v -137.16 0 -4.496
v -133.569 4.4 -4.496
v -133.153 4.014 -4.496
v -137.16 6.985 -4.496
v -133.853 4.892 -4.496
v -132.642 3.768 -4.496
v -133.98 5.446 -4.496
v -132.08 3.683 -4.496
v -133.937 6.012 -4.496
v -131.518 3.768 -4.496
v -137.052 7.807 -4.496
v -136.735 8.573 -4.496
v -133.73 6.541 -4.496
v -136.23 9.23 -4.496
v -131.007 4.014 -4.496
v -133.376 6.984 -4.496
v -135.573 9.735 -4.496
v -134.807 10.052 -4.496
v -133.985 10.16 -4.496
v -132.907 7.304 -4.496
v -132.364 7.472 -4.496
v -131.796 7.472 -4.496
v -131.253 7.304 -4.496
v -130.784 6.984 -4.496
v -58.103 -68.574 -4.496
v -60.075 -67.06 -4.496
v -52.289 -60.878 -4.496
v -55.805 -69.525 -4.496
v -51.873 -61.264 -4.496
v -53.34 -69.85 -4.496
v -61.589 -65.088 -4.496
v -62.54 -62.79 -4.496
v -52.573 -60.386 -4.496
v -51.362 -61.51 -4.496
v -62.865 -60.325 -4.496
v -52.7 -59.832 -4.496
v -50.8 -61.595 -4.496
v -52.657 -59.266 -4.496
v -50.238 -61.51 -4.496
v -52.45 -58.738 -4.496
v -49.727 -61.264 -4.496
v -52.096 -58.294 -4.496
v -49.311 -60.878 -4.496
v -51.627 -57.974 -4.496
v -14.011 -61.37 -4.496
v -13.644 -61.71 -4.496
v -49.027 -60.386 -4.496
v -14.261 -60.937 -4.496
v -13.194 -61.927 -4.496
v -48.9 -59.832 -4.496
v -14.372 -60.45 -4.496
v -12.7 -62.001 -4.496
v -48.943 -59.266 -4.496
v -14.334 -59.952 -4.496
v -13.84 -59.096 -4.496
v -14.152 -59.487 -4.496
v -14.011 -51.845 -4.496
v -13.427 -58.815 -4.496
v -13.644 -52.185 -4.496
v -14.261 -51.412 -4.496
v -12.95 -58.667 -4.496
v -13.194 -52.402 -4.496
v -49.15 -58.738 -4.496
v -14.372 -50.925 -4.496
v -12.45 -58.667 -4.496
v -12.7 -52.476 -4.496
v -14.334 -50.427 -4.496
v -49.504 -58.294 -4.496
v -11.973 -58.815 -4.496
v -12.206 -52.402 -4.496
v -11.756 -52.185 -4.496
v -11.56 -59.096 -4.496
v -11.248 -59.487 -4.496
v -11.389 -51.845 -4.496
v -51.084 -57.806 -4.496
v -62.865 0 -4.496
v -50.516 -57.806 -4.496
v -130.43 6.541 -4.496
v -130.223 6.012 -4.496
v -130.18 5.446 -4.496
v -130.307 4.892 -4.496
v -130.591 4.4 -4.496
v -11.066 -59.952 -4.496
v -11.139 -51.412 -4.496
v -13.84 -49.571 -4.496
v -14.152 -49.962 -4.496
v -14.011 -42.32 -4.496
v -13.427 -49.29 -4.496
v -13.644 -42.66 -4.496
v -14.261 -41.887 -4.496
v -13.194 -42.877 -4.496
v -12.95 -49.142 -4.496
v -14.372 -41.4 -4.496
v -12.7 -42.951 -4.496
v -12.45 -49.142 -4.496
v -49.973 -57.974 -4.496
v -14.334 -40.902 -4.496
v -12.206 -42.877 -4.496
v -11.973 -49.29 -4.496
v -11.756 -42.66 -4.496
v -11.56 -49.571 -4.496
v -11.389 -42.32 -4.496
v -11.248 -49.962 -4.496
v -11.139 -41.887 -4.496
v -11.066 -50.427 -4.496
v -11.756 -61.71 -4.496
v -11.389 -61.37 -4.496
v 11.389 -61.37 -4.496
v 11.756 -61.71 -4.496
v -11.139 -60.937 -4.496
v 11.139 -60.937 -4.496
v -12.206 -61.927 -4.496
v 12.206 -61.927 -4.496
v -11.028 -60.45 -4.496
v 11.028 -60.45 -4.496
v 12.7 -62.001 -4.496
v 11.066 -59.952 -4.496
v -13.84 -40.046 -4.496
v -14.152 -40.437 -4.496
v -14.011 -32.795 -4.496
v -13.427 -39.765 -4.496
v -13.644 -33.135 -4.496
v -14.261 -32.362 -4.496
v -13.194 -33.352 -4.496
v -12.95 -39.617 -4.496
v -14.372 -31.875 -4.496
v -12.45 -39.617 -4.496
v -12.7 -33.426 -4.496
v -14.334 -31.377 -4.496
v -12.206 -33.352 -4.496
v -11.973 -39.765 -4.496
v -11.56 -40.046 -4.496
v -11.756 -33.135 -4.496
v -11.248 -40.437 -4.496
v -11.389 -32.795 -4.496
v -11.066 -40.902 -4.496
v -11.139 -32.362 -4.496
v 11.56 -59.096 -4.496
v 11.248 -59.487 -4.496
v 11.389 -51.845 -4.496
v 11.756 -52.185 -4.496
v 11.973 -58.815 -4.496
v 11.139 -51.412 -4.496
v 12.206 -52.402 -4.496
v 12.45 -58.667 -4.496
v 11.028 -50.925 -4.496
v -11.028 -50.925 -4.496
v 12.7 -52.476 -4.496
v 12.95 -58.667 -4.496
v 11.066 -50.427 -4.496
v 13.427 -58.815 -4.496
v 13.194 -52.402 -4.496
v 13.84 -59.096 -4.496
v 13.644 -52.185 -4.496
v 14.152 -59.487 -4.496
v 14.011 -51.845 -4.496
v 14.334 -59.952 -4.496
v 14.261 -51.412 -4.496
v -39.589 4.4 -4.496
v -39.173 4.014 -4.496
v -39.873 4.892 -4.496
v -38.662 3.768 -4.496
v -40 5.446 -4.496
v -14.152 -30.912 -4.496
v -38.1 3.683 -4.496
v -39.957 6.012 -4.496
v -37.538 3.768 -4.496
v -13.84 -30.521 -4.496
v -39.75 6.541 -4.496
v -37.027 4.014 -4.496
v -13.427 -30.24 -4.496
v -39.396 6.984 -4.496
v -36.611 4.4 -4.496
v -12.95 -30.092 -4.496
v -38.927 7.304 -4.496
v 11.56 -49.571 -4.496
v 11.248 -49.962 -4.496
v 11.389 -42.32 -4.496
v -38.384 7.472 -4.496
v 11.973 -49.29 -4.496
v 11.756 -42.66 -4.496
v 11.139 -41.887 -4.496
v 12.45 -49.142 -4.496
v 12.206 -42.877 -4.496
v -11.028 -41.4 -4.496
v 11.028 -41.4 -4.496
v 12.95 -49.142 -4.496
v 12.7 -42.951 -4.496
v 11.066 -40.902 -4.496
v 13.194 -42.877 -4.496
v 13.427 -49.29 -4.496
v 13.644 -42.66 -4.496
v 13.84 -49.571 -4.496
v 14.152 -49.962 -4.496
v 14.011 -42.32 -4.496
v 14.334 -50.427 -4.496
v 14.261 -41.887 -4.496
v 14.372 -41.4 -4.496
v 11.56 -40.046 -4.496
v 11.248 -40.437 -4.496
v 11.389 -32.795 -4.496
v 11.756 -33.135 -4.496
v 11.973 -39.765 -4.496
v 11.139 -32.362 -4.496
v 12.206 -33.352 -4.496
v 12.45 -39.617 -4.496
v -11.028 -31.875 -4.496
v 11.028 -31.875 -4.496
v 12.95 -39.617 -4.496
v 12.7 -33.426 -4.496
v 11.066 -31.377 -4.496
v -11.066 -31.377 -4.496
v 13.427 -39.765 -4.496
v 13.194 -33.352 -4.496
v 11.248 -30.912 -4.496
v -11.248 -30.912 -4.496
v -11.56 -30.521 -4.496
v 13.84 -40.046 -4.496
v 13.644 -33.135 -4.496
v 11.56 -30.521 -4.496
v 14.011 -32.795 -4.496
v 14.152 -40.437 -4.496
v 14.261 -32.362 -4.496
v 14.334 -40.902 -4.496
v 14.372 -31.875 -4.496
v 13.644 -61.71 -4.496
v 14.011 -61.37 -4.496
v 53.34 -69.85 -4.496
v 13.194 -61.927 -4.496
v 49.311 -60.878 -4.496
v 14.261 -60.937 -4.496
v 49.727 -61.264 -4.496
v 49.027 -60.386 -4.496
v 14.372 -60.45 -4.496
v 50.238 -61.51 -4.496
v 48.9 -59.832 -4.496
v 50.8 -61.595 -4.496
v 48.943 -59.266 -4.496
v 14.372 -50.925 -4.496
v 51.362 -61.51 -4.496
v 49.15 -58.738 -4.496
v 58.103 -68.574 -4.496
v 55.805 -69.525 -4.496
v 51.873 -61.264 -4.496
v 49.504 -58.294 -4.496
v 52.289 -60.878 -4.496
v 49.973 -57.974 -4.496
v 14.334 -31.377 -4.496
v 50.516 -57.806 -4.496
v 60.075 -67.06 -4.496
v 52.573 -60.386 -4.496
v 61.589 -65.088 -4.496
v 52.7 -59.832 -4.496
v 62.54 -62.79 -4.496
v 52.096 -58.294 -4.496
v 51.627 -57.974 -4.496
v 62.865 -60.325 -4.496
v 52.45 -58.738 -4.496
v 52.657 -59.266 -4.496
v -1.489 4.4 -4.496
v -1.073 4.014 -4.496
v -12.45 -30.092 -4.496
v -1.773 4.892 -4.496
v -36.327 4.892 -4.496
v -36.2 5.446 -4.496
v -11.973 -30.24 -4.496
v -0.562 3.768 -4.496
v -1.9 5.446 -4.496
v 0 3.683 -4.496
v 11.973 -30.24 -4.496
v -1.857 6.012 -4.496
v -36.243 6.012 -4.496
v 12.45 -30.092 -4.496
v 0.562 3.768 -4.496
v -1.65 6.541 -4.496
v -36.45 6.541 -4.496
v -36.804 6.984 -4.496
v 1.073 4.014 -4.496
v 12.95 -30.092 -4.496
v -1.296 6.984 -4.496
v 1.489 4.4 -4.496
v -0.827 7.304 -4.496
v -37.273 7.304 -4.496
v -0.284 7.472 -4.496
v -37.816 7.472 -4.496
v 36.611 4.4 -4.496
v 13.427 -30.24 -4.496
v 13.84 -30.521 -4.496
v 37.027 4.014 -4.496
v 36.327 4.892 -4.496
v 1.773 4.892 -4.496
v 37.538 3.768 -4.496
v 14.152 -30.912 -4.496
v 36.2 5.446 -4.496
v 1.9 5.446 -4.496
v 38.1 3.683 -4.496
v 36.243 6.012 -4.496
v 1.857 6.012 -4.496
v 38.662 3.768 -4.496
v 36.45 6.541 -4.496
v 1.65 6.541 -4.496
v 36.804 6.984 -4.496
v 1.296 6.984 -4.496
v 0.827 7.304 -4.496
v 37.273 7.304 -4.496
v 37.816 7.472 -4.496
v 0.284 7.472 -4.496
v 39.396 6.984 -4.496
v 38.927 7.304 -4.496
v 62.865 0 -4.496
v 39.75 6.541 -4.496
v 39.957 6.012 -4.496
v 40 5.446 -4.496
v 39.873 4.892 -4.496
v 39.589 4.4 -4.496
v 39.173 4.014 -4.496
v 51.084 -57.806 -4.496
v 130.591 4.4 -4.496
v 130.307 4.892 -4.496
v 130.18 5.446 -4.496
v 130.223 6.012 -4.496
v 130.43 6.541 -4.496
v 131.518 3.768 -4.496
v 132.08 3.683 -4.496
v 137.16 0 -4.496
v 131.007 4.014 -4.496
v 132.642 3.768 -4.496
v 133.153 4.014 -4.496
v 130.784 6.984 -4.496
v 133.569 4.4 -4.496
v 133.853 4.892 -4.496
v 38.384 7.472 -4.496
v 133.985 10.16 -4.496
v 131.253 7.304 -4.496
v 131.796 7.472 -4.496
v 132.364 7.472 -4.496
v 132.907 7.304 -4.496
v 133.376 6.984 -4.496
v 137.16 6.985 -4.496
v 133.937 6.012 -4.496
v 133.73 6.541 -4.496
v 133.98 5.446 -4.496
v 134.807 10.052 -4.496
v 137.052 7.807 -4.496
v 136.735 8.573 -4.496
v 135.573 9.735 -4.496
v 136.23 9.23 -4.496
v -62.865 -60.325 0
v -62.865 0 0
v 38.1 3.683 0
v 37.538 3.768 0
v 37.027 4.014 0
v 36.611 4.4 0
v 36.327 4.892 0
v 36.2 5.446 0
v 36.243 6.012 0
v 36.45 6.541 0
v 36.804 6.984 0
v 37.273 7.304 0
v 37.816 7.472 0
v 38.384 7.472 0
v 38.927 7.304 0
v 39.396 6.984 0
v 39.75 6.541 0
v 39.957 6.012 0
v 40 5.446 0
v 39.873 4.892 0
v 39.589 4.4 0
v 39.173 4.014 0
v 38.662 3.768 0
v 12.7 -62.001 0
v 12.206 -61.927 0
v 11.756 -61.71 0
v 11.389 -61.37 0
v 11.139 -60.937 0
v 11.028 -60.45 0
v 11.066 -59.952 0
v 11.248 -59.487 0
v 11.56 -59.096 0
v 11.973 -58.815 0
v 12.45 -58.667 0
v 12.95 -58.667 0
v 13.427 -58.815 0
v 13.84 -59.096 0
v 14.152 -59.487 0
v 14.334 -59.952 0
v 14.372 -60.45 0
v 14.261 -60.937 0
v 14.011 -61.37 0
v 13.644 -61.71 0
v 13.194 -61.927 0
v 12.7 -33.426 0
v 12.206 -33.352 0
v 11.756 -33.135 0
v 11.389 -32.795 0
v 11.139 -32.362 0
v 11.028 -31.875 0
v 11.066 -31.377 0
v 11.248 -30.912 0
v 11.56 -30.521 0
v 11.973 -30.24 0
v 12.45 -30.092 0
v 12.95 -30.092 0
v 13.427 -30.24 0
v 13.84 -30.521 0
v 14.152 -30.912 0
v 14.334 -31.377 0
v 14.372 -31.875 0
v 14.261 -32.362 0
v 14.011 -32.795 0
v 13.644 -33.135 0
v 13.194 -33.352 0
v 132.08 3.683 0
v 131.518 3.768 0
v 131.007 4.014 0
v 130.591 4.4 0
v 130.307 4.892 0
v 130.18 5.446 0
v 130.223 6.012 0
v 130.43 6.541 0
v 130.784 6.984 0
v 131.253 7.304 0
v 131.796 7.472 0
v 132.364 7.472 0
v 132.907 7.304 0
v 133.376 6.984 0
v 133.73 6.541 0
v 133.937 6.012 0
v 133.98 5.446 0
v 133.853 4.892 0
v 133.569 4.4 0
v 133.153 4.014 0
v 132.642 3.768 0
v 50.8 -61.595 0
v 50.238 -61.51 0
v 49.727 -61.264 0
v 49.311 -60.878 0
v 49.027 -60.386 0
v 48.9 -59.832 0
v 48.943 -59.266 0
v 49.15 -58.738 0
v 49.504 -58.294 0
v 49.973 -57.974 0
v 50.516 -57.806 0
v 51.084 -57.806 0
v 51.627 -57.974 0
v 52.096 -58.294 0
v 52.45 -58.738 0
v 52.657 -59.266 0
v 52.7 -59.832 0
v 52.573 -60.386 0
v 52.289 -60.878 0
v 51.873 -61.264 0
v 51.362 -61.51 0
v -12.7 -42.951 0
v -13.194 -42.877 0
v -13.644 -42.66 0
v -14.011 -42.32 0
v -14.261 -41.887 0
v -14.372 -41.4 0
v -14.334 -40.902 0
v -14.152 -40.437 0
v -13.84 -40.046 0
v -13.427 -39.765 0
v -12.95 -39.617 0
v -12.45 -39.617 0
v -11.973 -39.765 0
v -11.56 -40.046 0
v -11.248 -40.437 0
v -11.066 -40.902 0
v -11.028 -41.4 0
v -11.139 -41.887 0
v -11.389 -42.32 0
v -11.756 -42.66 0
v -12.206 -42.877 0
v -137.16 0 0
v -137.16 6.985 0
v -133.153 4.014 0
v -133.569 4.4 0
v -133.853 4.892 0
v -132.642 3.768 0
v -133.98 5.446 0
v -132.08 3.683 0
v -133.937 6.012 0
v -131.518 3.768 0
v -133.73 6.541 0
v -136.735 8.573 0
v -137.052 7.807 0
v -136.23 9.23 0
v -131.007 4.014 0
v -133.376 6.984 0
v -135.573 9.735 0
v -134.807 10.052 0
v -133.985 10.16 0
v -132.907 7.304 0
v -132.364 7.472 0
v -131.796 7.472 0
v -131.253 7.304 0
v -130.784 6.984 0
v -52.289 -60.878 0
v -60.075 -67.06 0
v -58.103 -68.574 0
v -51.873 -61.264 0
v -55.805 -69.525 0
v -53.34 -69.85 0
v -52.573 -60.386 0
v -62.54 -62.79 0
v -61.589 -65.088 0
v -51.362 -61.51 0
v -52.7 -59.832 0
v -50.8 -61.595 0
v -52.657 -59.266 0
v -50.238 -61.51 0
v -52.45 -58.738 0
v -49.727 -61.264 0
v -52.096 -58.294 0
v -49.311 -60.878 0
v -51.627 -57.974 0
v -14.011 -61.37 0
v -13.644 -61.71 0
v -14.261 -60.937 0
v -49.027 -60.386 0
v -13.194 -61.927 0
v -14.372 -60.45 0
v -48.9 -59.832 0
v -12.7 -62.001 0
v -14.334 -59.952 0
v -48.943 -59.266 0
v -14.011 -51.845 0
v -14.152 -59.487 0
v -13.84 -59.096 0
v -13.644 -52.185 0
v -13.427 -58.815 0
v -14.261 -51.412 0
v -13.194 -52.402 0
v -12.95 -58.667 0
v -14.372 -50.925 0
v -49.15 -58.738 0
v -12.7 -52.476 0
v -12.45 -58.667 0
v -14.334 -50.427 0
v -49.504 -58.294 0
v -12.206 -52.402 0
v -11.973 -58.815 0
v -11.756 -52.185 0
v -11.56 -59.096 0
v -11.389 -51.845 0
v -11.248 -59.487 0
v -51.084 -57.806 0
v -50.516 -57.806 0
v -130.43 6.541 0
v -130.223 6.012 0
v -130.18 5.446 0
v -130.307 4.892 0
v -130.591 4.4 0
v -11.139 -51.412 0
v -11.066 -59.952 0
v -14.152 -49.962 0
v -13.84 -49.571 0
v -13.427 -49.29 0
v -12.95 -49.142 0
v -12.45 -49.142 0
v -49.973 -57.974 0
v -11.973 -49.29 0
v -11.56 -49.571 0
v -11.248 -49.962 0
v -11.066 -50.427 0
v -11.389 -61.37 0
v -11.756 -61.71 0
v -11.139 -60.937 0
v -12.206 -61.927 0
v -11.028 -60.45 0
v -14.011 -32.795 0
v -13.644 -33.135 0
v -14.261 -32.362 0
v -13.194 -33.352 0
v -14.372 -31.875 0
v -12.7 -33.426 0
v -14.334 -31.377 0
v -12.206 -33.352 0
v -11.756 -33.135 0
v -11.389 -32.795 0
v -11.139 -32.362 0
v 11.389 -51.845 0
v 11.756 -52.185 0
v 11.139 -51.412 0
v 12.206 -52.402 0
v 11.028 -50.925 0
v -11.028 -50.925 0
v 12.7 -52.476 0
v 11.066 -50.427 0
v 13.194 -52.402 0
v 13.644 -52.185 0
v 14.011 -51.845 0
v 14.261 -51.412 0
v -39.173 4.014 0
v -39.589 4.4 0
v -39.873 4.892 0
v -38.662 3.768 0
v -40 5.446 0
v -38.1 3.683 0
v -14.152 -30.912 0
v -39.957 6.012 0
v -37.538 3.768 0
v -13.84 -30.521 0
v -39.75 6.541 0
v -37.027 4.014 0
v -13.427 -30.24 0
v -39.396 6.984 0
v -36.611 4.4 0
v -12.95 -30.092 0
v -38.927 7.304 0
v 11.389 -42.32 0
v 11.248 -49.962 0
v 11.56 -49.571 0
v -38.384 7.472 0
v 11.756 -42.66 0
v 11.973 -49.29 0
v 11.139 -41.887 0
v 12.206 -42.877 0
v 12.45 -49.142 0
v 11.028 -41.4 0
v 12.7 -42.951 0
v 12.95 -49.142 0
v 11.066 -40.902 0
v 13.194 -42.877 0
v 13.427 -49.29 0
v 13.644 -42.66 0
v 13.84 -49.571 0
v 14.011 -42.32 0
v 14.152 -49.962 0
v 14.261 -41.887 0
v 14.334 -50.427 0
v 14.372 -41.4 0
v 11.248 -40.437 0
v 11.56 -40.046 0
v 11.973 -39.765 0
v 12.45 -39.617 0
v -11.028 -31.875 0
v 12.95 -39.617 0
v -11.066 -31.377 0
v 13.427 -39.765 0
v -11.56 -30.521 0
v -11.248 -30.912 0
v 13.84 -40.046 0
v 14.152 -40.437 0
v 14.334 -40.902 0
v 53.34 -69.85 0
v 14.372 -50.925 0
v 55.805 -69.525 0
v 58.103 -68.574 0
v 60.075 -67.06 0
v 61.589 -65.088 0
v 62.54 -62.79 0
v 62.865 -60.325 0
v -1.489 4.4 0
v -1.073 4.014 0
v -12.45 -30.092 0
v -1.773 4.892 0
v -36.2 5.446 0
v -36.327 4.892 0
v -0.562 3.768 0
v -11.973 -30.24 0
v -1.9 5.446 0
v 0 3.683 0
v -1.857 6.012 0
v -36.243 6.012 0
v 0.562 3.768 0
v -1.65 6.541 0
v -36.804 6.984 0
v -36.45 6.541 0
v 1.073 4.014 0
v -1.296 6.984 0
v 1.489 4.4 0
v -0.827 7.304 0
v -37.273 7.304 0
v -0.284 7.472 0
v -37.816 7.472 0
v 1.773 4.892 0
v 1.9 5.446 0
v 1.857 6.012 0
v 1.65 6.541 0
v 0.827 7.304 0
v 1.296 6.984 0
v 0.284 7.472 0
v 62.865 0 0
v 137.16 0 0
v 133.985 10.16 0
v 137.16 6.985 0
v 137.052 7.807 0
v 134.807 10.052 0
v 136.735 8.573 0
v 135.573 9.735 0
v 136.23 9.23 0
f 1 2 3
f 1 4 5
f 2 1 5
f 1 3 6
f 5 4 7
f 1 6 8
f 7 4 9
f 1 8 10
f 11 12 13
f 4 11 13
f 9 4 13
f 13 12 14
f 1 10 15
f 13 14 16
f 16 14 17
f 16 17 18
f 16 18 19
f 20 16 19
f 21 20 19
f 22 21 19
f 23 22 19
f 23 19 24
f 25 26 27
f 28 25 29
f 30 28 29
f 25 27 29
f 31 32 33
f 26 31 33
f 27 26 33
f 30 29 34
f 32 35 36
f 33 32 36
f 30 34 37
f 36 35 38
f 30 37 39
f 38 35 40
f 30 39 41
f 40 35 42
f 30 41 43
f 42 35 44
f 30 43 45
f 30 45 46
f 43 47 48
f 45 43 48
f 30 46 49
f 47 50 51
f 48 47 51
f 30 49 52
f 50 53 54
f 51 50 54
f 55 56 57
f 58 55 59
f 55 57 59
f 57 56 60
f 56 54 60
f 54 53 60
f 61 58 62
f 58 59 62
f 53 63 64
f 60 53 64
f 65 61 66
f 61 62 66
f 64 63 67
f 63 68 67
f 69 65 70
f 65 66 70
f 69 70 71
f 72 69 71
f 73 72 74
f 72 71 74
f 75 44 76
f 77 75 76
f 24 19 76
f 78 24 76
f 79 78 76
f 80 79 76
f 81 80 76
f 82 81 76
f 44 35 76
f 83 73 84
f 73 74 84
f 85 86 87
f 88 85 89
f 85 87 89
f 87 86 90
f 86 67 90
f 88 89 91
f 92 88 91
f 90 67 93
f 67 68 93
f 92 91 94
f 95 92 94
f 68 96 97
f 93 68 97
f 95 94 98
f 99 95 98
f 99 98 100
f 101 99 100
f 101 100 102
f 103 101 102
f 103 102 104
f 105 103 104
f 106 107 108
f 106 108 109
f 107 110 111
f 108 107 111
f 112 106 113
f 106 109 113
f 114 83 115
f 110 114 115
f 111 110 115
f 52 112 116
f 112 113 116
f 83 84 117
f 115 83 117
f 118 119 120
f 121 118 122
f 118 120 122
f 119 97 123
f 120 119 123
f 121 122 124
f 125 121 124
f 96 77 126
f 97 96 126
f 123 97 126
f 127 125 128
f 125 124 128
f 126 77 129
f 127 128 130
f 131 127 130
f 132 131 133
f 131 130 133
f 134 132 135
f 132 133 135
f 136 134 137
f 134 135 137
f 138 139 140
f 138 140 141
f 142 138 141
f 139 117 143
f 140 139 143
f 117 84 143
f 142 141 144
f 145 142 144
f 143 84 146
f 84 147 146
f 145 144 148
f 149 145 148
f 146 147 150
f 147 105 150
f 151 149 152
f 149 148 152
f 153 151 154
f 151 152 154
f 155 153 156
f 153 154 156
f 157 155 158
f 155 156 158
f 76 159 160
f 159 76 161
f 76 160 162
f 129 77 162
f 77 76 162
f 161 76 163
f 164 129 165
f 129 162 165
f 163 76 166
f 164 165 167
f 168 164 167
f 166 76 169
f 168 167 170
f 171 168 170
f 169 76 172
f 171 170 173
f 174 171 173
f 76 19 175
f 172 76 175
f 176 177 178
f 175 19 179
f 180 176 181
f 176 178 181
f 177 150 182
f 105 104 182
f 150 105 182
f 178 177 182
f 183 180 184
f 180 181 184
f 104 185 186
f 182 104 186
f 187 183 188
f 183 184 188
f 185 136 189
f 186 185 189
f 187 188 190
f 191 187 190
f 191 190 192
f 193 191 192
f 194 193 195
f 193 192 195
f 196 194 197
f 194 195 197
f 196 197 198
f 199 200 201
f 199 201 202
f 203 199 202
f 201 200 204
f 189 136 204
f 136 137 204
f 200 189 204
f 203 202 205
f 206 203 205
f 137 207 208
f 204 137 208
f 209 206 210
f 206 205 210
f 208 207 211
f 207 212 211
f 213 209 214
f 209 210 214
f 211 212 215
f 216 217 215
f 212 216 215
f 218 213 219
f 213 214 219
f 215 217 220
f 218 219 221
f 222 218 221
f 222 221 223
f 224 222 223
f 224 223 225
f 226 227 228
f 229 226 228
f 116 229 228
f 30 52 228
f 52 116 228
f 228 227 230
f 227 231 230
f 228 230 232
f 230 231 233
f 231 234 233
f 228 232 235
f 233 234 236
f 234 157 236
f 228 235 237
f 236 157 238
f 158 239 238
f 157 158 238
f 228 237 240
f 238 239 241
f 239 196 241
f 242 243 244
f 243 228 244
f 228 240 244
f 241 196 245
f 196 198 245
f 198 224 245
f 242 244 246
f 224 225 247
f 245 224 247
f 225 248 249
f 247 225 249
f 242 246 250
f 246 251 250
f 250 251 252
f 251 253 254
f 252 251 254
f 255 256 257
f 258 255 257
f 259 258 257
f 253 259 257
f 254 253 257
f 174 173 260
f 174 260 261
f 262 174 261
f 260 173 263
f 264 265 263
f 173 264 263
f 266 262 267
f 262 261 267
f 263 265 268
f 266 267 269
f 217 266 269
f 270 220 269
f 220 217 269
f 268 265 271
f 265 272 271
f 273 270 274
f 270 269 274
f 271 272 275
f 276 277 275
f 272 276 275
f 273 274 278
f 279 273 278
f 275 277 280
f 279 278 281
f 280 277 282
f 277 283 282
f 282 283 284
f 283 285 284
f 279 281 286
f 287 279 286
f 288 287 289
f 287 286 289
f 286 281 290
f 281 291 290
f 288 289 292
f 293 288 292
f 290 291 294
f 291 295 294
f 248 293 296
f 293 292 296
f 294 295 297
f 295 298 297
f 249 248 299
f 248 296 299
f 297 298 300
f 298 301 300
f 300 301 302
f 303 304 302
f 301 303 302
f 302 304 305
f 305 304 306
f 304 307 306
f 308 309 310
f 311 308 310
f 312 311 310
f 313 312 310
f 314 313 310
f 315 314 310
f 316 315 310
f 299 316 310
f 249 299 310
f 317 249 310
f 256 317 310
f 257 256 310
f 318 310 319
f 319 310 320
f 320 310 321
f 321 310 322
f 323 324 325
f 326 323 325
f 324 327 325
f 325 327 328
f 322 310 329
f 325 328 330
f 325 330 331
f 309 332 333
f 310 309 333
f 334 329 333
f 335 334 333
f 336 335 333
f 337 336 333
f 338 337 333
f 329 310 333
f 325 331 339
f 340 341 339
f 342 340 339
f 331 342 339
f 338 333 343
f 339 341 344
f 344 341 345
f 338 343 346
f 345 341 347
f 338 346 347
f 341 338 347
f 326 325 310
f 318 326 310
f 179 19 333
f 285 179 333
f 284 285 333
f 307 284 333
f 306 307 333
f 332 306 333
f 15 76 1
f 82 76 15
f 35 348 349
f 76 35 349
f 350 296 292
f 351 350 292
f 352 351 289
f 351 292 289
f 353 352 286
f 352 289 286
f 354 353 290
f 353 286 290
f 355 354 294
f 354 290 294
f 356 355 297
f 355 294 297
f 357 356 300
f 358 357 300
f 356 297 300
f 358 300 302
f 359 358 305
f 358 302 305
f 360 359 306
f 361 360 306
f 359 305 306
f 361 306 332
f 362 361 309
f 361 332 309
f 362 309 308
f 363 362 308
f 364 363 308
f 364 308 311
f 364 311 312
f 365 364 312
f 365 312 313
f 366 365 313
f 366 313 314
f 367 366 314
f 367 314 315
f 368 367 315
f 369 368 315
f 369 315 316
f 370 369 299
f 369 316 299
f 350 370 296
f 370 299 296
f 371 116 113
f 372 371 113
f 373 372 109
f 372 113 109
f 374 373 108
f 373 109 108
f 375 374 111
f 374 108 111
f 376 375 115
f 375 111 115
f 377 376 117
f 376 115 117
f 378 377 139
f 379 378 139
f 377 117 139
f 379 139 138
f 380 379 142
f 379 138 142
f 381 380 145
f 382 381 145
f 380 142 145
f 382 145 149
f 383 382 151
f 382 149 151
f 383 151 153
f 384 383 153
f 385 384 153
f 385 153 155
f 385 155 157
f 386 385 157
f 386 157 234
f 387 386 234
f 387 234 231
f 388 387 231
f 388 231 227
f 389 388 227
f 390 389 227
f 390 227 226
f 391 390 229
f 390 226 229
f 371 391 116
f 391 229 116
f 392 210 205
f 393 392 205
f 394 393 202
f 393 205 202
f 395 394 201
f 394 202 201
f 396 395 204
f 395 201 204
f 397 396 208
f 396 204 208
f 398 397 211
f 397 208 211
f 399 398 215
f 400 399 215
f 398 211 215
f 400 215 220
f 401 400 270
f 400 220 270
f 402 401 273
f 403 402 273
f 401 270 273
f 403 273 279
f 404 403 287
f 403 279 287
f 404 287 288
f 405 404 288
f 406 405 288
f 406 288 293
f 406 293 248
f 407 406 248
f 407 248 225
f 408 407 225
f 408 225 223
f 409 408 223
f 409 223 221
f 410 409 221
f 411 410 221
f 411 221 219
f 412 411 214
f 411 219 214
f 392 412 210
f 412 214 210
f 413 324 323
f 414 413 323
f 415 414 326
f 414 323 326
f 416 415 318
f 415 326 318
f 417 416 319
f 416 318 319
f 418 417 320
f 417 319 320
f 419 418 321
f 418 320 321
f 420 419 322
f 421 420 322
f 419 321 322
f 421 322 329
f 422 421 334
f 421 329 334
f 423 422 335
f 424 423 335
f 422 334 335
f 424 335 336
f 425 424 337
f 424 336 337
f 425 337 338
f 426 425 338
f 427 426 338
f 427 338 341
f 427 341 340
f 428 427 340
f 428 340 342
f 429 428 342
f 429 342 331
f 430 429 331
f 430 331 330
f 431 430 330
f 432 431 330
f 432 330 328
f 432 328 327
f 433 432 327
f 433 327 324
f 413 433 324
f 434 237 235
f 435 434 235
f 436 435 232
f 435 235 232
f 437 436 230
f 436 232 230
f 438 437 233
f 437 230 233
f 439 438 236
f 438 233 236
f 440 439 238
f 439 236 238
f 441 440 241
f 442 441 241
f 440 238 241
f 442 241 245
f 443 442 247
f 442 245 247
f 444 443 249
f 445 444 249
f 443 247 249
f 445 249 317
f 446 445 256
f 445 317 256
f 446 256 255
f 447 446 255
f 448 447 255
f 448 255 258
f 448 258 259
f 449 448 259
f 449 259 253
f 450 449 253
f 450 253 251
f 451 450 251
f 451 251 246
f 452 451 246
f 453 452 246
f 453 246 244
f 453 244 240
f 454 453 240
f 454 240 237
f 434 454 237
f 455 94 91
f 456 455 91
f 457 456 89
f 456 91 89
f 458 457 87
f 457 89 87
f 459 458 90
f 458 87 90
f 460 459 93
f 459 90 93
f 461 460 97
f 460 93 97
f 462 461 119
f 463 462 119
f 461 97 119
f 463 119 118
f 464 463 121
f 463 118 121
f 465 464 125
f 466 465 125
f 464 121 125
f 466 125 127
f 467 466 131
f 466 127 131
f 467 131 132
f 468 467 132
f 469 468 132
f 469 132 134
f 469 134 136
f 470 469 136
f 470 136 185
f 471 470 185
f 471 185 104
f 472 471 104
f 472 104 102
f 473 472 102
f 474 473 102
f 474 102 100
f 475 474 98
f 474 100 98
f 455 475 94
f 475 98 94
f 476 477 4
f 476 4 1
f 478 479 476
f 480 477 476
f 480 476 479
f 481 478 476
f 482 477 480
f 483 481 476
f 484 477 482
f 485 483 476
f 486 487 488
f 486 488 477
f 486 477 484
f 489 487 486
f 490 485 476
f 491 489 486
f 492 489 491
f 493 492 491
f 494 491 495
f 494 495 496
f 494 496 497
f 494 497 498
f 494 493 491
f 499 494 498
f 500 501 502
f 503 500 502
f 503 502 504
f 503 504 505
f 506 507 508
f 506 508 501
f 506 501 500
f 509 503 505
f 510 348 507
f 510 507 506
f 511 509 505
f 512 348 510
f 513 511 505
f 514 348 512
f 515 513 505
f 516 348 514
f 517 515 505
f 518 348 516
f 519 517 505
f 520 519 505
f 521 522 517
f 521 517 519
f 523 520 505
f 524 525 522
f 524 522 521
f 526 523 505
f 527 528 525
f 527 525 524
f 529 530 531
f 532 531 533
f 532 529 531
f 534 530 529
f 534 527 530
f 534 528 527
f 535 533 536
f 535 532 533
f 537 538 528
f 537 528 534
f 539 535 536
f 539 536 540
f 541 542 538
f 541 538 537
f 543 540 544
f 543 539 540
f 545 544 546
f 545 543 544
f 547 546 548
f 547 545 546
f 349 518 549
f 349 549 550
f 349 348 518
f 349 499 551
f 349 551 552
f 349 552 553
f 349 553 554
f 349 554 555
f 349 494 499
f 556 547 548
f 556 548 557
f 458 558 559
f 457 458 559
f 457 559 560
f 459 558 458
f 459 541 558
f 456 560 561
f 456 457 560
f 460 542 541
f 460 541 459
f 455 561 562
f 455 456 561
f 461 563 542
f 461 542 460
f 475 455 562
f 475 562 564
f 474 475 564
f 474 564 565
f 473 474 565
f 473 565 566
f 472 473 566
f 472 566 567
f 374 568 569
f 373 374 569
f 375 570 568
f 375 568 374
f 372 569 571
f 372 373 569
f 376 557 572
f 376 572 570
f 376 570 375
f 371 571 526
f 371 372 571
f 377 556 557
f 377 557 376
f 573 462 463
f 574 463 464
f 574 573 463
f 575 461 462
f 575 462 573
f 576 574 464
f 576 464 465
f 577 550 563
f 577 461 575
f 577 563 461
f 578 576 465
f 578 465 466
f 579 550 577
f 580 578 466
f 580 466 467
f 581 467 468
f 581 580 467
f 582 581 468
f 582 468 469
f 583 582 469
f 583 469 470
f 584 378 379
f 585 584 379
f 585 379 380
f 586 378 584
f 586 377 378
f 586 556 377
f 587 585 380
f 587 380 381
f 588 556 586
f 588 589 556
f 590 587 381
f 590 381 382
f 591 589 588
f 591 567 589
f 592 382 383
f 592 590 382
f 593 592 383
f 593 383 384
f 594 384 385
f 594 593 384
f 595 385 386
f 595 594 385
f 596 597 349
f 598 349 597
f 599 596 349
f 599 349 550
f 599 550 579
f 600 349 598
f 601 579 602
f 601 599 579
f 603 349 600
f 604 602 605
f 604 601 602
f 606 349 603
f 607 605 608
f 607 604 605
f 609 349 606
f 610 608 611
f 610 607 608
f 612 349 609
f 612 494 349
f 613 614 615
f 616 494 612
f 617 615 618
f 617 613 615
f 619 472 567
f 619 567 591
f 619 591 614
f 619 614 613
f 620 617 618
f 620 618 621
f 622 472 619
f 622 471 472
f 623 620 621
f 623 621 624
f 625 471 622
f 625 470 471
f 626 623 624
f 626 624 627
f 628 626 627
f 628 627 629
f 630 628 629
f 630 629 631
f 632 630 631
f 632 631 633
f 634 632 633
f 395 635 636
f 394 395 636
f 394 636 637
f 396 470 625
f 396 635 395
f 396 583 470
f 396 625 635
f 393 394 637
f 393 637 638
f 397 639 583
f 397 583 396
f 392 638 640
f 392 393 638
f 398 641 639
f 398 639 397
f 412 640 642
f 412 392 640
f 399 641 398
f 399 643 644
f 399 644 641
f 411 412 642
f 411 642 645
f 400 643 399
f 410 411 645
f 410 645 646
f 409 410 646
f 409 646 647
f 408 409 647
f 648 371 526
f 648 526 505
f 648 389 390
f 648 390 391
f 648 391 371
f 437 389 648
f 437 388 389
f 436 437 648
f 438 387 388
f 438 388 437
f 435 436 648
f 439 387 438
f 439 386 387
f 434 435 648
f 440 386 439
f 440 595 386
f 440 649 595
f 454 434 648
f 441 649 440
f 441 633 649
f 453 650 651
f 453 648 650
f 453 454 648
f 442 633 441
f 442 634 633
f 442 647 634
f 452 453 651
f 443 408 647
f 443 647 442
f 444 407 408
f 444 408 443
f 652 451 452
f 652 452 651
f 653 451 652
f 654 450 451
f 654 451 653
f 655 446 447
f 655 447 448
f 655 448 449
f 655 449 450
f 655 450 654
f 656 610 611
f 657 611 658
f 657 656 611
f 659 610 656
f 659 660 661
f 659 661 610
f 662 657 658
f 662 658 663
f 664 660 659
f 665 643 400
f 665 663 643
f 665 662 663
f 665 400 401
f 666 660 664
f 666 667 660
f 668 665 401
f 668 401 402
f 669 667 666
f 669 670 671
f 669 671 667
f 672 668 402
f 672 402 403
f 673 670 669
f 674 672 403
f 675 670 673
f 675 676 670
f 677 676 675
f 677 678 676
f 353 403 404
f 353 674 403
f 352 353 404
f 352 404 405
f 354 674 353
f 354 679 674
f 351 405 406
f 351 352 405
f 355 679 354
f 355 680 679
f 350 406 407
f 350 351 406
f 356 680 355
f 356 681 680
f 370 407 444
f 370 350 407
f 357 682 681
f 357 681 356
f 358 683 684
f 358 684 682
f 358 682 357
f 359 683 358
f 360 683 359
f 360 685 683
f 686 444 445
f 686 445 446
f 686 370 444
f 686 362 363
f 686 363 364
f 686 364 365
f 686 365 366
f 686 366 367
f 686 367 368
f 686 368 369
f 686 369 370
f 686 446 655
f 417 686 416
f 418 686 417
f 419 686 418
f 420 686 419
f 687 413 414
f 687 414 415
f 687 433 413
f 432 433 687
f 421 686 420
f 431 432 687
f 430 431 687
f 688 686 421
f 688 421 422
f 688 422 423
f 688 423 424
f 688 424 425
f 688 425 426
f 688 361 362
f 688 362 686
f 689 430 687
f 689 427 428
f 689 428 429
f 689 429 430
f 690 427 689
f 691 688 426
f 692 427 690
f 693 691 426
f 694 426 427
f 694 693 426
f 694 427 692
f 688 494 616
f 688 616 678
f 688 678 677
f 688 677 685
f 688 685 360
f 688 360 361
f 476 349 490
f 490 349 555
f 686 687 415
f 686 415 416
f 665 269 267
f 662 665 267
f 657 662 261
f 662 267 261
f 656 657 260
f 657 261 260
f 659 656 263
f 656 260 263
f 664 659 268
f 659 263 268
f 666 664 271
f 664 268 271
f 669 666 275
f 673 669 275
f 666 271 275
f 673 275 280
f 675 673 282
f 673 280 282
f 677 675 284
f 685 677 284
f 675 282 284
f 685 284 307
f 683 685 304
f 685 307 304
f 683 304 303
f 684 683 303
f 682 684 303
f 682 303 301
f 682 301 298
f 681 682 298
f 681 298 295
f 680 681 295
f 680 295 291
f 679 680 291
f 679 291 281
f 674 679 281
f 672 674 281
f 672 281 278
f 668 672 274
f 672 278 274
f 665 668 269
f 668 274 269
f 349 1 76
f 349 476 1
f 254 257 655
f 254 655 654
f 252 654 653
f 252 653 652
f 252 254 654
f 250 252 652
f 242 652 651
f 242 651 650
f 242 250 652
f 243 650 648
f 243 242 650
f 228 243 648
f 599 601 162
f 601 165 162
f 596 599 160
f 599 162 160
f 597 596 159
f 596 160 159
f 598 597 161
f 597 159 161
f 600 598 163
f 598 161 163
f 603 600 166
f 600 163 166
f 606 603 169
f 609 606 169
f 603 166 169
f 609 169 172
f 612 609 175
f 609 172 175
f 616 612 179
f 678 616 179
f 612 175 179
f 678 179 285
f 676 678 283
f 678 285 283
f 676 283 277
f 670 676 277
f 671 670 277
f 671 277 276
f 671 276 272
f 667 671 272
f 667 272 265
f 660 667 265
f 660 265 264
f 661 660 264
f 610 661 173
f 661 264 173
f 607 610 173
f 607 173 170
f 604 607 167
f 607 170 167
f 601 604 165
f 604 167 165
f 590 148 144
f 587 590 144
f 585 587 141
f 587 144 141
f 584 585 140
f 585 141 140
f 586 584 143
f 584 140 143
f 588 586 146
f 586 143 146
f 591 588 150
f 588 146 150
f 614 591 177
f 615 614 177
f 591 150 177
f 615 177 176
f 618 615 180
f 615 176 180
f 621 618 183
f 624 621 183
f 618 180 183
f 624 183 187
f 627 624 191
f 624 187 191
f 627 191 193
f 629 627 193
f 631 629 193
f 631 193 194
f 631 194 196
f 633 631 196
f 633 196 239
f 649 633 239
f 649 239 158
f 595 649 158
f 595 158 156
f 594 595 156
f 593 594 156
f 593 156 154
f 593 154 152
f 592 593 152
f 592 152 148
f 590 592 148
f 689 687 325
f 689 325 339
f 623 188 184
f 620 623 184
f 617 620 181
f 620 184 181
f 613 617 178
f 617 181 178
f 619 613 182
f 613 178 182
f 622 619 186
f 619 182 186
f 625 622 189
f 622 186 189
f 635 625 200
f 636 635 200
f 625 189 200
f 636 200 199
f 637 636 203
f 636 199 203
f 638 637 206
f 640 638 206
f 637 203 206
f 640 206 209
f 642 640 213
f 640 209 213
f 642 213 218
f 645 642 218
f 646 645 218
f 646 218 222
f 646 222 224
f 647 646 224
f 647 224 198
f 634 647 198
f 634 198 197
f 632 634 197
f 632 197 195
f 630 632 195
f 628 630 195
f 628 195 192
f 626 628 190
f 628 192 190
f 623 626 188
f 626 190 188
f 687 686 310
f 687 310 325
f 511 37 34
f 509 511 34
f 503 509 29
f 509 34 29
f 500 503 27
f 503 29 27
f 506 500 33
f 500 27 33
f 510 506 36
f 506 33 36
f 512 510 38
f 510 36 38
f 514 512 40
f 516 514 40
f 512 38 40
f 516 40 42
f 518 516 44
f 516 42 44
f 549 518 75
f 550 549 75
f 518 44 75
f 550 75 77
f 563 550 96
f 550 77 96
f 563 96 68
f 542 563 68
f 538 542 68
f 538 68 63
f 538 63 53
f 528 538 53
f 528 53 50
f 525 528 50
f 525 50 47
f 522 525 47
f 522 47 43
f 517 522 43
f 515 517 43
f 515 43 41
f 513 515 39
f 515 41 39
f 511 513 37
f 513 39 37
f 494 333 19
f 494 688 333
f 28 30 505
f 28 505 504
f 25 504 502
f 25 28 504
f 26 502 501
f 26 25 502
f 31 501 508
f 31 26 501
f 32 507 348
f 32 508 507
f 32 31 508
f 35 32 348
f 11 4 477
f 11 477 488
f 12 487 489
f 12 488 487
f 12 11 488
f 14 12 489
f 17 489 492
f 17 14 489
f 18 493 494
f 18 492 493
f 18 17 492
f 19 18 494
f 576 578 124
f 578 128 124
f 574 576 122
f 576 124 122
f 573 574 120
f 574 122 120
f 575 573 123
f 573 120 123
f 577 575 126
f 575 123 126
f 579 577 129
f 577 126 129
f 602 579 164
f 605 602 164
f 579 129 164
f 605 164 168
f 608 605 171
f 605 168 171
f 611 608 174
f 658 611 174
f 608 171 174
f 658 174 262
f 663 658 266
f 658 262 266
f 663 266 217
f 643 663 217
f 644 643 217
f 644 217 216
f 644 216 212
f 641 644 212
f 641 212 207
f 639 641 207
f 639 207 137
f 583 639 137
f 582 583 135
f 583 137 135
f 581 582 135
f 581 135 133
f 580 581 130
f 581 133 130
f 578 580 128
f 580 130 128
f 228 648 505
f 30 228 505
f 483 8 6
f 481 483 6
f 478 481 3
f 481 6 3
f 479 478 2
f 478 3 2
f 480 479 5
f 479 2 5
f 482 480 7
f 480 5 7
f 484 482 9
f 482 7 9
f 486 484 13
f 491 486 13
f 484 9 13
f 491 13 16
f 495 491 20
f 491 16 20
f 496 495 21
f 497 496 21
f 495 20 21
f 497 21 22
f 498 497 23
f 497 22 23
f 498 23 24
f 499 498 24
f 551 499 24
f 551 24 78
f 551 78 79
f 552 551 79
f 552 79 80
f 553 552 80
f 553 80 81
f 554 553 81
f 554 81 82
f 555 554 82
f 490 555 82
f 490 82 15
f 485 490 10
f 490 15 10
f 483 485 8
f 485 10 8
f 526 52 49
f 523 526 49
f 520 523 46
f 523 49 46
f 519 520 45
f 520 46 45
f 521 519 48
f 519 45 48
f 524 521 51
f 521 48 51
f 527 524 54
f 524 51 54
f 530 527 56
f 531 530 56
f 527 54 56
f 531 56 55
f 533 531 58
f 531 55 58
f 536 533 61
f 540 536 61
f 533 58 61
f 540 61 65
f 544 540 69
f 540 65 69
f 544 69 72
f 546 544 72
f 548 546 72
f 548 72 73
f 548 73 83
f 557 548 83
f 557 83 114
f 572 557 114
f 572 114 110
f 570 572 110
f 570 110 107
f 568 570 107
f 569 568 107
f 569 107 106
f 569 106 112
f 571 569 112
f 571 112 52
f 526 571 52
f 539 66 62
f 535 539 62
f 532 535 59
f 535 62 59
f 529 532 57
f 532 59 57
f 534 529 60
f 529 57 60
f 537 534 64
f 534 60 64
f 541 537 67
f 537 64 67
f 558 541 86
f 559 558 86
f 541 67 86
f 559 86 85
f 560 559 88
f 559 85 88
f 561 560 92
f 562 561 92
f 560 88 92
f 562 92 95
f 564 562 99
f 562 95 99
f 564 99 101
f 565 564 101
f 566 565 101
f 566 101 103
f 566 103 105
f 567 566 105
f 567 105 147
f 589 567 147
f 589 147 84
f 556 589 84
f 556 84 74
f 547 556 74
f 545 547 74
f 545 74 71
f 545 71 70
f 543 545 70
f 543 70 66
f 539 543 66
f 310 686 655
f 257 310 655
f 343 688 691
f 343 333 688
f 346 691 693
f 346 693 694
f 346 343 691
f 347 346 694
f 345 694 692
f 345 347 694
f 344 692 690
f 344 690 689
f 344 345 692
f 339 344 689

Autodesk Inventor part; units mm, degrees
ref_plane "YZ Plane" through (0, 0, 0) normal (1, 0, 0) x (0, 1, 0)
ref_plane "XZ Plane" through (0, 0, 0) normal (0, 1, 0) x (-1, 0, 0)
ref_plane "XY Plane" through (0, 0, 0) normal (0, 0, 1) x (1, 0, 0)
sketch "Sketch1" plane through (0, 0, 0) normal (0, 0, 1) x (1, 0, 0)
  line L0 (0, 26.162) -> (0, -85.852) projected
  line L1 (-192.024, 0) -> (192.024, 0) projected
  line L2 (137.16, 10.16) -> (-137.16, 10.16)
  line L3 (-137.16, 10.16) -> (-137.16, 0)
  line L4 (-137.16, 0) -> (137.16, 0)
  line L5 (137.16, 0) -> (137.16, 10.16)
  line L6 (137.16, 10.16) -> (-137.16, 0) construction
  line L7 (-137.16, 10.16) -> (137.16, 0) construction
  line L8 (62.865, -69.85) -> (-62.865, -69.85)
  line L9 (-62.865, -69.85) -> (-62.865, 0)
  line L10 (-62.865, 0) -> (62.865, 0)
  line L11 (62.865, 0) -> (62.865, -69.85)
  line L12 (62.865, -69.85) -> (-62.865, 0) construction
  line L13 (-62.865, -69.85) -> (62.865, 0) construction
  point P0 (0, 0)
  point P1 (0, 5.08)
  point P2 (0, 5.588)
  point P3 (-132.08, 5.588)
  point P4 (132.08, 5.588)
  point P5 (0, -34.925)
  point P6 (12.7, -31.75)
  point P7 (-38.1, 5.588)
  point P8 (38.1, 5.588)
  point P9 (-50.8, -59.69)
  point P10 (50.8, -59.69)
  point P11 (0, -34.925)
  dimension "d0" = 274.32
  dimension "d1" = 10.16
  dimension "d2" = 5.588
  dimension "d13" = 5.08
  dimension "d14" = 5.08
  dimension "d15" = 69.85
  dimension "d16" = 125.73
  dimension "d29" = 38.1
  dimension "d30" = 38.1
  dimension "d31" = 101.6
  dimension "d32" = 50.8
  dimension "d33" = 10.16
  dimension "d44" = 31.75
  dimension "d45" = 12.7
extrude "Extrusion1" add sketch "Sketch1" against normal blind 4.4958 contours L2 L5 L1 L0 | L0 L1 L3 L2
hole "Hole1" at (0, 5.588, 0) at (-132.08, 5.588, 0) at (132.08, 5.588, 0) at (-38.1, 5.588, 0) at (38.1, 5.588, 0) direction (0, 0, -1) diameter 3.81 end through all clearance for "Socket Head Cap Screw" size "#6" standard "Ansi Unified Screw Threads"
fillet "Fillet1" radius 3.175 2 edges at (-137.16, 10.16, -2.2479) (137.16, 10.16, -2.2479)
extrude "Extrusion2" add sketch "Sketch1" against normal up to surface (4.4958 mm away) contours L1 L11 L8 L0 | L0 L8 L9 L1
fillet "Fillet2" radius 9.525 2 edges at (-62.865, -69.85, -2.2479) (62.865, -69.85, -2.2479)
hole "Hole2" at (12.7, -31.75, 0) direction (0, 0, -1) diameter 3.3528 end through all
hole "Hole3" at (-50.8, -59.69, 0) at (50.8, -59.69, 0) direction (0, 0, -1) diameter 3.81 end through all clearance for "Socket Head Cap Screw" size "#6" standard "Ansi Unified Screw Threads"
pattern_linear "Rectangular Pattern1" count 4 spacing 9.525 along (0, -1, 0) count 2 spacing 25.4 along (-1, 0, 0) of "Hole2"
